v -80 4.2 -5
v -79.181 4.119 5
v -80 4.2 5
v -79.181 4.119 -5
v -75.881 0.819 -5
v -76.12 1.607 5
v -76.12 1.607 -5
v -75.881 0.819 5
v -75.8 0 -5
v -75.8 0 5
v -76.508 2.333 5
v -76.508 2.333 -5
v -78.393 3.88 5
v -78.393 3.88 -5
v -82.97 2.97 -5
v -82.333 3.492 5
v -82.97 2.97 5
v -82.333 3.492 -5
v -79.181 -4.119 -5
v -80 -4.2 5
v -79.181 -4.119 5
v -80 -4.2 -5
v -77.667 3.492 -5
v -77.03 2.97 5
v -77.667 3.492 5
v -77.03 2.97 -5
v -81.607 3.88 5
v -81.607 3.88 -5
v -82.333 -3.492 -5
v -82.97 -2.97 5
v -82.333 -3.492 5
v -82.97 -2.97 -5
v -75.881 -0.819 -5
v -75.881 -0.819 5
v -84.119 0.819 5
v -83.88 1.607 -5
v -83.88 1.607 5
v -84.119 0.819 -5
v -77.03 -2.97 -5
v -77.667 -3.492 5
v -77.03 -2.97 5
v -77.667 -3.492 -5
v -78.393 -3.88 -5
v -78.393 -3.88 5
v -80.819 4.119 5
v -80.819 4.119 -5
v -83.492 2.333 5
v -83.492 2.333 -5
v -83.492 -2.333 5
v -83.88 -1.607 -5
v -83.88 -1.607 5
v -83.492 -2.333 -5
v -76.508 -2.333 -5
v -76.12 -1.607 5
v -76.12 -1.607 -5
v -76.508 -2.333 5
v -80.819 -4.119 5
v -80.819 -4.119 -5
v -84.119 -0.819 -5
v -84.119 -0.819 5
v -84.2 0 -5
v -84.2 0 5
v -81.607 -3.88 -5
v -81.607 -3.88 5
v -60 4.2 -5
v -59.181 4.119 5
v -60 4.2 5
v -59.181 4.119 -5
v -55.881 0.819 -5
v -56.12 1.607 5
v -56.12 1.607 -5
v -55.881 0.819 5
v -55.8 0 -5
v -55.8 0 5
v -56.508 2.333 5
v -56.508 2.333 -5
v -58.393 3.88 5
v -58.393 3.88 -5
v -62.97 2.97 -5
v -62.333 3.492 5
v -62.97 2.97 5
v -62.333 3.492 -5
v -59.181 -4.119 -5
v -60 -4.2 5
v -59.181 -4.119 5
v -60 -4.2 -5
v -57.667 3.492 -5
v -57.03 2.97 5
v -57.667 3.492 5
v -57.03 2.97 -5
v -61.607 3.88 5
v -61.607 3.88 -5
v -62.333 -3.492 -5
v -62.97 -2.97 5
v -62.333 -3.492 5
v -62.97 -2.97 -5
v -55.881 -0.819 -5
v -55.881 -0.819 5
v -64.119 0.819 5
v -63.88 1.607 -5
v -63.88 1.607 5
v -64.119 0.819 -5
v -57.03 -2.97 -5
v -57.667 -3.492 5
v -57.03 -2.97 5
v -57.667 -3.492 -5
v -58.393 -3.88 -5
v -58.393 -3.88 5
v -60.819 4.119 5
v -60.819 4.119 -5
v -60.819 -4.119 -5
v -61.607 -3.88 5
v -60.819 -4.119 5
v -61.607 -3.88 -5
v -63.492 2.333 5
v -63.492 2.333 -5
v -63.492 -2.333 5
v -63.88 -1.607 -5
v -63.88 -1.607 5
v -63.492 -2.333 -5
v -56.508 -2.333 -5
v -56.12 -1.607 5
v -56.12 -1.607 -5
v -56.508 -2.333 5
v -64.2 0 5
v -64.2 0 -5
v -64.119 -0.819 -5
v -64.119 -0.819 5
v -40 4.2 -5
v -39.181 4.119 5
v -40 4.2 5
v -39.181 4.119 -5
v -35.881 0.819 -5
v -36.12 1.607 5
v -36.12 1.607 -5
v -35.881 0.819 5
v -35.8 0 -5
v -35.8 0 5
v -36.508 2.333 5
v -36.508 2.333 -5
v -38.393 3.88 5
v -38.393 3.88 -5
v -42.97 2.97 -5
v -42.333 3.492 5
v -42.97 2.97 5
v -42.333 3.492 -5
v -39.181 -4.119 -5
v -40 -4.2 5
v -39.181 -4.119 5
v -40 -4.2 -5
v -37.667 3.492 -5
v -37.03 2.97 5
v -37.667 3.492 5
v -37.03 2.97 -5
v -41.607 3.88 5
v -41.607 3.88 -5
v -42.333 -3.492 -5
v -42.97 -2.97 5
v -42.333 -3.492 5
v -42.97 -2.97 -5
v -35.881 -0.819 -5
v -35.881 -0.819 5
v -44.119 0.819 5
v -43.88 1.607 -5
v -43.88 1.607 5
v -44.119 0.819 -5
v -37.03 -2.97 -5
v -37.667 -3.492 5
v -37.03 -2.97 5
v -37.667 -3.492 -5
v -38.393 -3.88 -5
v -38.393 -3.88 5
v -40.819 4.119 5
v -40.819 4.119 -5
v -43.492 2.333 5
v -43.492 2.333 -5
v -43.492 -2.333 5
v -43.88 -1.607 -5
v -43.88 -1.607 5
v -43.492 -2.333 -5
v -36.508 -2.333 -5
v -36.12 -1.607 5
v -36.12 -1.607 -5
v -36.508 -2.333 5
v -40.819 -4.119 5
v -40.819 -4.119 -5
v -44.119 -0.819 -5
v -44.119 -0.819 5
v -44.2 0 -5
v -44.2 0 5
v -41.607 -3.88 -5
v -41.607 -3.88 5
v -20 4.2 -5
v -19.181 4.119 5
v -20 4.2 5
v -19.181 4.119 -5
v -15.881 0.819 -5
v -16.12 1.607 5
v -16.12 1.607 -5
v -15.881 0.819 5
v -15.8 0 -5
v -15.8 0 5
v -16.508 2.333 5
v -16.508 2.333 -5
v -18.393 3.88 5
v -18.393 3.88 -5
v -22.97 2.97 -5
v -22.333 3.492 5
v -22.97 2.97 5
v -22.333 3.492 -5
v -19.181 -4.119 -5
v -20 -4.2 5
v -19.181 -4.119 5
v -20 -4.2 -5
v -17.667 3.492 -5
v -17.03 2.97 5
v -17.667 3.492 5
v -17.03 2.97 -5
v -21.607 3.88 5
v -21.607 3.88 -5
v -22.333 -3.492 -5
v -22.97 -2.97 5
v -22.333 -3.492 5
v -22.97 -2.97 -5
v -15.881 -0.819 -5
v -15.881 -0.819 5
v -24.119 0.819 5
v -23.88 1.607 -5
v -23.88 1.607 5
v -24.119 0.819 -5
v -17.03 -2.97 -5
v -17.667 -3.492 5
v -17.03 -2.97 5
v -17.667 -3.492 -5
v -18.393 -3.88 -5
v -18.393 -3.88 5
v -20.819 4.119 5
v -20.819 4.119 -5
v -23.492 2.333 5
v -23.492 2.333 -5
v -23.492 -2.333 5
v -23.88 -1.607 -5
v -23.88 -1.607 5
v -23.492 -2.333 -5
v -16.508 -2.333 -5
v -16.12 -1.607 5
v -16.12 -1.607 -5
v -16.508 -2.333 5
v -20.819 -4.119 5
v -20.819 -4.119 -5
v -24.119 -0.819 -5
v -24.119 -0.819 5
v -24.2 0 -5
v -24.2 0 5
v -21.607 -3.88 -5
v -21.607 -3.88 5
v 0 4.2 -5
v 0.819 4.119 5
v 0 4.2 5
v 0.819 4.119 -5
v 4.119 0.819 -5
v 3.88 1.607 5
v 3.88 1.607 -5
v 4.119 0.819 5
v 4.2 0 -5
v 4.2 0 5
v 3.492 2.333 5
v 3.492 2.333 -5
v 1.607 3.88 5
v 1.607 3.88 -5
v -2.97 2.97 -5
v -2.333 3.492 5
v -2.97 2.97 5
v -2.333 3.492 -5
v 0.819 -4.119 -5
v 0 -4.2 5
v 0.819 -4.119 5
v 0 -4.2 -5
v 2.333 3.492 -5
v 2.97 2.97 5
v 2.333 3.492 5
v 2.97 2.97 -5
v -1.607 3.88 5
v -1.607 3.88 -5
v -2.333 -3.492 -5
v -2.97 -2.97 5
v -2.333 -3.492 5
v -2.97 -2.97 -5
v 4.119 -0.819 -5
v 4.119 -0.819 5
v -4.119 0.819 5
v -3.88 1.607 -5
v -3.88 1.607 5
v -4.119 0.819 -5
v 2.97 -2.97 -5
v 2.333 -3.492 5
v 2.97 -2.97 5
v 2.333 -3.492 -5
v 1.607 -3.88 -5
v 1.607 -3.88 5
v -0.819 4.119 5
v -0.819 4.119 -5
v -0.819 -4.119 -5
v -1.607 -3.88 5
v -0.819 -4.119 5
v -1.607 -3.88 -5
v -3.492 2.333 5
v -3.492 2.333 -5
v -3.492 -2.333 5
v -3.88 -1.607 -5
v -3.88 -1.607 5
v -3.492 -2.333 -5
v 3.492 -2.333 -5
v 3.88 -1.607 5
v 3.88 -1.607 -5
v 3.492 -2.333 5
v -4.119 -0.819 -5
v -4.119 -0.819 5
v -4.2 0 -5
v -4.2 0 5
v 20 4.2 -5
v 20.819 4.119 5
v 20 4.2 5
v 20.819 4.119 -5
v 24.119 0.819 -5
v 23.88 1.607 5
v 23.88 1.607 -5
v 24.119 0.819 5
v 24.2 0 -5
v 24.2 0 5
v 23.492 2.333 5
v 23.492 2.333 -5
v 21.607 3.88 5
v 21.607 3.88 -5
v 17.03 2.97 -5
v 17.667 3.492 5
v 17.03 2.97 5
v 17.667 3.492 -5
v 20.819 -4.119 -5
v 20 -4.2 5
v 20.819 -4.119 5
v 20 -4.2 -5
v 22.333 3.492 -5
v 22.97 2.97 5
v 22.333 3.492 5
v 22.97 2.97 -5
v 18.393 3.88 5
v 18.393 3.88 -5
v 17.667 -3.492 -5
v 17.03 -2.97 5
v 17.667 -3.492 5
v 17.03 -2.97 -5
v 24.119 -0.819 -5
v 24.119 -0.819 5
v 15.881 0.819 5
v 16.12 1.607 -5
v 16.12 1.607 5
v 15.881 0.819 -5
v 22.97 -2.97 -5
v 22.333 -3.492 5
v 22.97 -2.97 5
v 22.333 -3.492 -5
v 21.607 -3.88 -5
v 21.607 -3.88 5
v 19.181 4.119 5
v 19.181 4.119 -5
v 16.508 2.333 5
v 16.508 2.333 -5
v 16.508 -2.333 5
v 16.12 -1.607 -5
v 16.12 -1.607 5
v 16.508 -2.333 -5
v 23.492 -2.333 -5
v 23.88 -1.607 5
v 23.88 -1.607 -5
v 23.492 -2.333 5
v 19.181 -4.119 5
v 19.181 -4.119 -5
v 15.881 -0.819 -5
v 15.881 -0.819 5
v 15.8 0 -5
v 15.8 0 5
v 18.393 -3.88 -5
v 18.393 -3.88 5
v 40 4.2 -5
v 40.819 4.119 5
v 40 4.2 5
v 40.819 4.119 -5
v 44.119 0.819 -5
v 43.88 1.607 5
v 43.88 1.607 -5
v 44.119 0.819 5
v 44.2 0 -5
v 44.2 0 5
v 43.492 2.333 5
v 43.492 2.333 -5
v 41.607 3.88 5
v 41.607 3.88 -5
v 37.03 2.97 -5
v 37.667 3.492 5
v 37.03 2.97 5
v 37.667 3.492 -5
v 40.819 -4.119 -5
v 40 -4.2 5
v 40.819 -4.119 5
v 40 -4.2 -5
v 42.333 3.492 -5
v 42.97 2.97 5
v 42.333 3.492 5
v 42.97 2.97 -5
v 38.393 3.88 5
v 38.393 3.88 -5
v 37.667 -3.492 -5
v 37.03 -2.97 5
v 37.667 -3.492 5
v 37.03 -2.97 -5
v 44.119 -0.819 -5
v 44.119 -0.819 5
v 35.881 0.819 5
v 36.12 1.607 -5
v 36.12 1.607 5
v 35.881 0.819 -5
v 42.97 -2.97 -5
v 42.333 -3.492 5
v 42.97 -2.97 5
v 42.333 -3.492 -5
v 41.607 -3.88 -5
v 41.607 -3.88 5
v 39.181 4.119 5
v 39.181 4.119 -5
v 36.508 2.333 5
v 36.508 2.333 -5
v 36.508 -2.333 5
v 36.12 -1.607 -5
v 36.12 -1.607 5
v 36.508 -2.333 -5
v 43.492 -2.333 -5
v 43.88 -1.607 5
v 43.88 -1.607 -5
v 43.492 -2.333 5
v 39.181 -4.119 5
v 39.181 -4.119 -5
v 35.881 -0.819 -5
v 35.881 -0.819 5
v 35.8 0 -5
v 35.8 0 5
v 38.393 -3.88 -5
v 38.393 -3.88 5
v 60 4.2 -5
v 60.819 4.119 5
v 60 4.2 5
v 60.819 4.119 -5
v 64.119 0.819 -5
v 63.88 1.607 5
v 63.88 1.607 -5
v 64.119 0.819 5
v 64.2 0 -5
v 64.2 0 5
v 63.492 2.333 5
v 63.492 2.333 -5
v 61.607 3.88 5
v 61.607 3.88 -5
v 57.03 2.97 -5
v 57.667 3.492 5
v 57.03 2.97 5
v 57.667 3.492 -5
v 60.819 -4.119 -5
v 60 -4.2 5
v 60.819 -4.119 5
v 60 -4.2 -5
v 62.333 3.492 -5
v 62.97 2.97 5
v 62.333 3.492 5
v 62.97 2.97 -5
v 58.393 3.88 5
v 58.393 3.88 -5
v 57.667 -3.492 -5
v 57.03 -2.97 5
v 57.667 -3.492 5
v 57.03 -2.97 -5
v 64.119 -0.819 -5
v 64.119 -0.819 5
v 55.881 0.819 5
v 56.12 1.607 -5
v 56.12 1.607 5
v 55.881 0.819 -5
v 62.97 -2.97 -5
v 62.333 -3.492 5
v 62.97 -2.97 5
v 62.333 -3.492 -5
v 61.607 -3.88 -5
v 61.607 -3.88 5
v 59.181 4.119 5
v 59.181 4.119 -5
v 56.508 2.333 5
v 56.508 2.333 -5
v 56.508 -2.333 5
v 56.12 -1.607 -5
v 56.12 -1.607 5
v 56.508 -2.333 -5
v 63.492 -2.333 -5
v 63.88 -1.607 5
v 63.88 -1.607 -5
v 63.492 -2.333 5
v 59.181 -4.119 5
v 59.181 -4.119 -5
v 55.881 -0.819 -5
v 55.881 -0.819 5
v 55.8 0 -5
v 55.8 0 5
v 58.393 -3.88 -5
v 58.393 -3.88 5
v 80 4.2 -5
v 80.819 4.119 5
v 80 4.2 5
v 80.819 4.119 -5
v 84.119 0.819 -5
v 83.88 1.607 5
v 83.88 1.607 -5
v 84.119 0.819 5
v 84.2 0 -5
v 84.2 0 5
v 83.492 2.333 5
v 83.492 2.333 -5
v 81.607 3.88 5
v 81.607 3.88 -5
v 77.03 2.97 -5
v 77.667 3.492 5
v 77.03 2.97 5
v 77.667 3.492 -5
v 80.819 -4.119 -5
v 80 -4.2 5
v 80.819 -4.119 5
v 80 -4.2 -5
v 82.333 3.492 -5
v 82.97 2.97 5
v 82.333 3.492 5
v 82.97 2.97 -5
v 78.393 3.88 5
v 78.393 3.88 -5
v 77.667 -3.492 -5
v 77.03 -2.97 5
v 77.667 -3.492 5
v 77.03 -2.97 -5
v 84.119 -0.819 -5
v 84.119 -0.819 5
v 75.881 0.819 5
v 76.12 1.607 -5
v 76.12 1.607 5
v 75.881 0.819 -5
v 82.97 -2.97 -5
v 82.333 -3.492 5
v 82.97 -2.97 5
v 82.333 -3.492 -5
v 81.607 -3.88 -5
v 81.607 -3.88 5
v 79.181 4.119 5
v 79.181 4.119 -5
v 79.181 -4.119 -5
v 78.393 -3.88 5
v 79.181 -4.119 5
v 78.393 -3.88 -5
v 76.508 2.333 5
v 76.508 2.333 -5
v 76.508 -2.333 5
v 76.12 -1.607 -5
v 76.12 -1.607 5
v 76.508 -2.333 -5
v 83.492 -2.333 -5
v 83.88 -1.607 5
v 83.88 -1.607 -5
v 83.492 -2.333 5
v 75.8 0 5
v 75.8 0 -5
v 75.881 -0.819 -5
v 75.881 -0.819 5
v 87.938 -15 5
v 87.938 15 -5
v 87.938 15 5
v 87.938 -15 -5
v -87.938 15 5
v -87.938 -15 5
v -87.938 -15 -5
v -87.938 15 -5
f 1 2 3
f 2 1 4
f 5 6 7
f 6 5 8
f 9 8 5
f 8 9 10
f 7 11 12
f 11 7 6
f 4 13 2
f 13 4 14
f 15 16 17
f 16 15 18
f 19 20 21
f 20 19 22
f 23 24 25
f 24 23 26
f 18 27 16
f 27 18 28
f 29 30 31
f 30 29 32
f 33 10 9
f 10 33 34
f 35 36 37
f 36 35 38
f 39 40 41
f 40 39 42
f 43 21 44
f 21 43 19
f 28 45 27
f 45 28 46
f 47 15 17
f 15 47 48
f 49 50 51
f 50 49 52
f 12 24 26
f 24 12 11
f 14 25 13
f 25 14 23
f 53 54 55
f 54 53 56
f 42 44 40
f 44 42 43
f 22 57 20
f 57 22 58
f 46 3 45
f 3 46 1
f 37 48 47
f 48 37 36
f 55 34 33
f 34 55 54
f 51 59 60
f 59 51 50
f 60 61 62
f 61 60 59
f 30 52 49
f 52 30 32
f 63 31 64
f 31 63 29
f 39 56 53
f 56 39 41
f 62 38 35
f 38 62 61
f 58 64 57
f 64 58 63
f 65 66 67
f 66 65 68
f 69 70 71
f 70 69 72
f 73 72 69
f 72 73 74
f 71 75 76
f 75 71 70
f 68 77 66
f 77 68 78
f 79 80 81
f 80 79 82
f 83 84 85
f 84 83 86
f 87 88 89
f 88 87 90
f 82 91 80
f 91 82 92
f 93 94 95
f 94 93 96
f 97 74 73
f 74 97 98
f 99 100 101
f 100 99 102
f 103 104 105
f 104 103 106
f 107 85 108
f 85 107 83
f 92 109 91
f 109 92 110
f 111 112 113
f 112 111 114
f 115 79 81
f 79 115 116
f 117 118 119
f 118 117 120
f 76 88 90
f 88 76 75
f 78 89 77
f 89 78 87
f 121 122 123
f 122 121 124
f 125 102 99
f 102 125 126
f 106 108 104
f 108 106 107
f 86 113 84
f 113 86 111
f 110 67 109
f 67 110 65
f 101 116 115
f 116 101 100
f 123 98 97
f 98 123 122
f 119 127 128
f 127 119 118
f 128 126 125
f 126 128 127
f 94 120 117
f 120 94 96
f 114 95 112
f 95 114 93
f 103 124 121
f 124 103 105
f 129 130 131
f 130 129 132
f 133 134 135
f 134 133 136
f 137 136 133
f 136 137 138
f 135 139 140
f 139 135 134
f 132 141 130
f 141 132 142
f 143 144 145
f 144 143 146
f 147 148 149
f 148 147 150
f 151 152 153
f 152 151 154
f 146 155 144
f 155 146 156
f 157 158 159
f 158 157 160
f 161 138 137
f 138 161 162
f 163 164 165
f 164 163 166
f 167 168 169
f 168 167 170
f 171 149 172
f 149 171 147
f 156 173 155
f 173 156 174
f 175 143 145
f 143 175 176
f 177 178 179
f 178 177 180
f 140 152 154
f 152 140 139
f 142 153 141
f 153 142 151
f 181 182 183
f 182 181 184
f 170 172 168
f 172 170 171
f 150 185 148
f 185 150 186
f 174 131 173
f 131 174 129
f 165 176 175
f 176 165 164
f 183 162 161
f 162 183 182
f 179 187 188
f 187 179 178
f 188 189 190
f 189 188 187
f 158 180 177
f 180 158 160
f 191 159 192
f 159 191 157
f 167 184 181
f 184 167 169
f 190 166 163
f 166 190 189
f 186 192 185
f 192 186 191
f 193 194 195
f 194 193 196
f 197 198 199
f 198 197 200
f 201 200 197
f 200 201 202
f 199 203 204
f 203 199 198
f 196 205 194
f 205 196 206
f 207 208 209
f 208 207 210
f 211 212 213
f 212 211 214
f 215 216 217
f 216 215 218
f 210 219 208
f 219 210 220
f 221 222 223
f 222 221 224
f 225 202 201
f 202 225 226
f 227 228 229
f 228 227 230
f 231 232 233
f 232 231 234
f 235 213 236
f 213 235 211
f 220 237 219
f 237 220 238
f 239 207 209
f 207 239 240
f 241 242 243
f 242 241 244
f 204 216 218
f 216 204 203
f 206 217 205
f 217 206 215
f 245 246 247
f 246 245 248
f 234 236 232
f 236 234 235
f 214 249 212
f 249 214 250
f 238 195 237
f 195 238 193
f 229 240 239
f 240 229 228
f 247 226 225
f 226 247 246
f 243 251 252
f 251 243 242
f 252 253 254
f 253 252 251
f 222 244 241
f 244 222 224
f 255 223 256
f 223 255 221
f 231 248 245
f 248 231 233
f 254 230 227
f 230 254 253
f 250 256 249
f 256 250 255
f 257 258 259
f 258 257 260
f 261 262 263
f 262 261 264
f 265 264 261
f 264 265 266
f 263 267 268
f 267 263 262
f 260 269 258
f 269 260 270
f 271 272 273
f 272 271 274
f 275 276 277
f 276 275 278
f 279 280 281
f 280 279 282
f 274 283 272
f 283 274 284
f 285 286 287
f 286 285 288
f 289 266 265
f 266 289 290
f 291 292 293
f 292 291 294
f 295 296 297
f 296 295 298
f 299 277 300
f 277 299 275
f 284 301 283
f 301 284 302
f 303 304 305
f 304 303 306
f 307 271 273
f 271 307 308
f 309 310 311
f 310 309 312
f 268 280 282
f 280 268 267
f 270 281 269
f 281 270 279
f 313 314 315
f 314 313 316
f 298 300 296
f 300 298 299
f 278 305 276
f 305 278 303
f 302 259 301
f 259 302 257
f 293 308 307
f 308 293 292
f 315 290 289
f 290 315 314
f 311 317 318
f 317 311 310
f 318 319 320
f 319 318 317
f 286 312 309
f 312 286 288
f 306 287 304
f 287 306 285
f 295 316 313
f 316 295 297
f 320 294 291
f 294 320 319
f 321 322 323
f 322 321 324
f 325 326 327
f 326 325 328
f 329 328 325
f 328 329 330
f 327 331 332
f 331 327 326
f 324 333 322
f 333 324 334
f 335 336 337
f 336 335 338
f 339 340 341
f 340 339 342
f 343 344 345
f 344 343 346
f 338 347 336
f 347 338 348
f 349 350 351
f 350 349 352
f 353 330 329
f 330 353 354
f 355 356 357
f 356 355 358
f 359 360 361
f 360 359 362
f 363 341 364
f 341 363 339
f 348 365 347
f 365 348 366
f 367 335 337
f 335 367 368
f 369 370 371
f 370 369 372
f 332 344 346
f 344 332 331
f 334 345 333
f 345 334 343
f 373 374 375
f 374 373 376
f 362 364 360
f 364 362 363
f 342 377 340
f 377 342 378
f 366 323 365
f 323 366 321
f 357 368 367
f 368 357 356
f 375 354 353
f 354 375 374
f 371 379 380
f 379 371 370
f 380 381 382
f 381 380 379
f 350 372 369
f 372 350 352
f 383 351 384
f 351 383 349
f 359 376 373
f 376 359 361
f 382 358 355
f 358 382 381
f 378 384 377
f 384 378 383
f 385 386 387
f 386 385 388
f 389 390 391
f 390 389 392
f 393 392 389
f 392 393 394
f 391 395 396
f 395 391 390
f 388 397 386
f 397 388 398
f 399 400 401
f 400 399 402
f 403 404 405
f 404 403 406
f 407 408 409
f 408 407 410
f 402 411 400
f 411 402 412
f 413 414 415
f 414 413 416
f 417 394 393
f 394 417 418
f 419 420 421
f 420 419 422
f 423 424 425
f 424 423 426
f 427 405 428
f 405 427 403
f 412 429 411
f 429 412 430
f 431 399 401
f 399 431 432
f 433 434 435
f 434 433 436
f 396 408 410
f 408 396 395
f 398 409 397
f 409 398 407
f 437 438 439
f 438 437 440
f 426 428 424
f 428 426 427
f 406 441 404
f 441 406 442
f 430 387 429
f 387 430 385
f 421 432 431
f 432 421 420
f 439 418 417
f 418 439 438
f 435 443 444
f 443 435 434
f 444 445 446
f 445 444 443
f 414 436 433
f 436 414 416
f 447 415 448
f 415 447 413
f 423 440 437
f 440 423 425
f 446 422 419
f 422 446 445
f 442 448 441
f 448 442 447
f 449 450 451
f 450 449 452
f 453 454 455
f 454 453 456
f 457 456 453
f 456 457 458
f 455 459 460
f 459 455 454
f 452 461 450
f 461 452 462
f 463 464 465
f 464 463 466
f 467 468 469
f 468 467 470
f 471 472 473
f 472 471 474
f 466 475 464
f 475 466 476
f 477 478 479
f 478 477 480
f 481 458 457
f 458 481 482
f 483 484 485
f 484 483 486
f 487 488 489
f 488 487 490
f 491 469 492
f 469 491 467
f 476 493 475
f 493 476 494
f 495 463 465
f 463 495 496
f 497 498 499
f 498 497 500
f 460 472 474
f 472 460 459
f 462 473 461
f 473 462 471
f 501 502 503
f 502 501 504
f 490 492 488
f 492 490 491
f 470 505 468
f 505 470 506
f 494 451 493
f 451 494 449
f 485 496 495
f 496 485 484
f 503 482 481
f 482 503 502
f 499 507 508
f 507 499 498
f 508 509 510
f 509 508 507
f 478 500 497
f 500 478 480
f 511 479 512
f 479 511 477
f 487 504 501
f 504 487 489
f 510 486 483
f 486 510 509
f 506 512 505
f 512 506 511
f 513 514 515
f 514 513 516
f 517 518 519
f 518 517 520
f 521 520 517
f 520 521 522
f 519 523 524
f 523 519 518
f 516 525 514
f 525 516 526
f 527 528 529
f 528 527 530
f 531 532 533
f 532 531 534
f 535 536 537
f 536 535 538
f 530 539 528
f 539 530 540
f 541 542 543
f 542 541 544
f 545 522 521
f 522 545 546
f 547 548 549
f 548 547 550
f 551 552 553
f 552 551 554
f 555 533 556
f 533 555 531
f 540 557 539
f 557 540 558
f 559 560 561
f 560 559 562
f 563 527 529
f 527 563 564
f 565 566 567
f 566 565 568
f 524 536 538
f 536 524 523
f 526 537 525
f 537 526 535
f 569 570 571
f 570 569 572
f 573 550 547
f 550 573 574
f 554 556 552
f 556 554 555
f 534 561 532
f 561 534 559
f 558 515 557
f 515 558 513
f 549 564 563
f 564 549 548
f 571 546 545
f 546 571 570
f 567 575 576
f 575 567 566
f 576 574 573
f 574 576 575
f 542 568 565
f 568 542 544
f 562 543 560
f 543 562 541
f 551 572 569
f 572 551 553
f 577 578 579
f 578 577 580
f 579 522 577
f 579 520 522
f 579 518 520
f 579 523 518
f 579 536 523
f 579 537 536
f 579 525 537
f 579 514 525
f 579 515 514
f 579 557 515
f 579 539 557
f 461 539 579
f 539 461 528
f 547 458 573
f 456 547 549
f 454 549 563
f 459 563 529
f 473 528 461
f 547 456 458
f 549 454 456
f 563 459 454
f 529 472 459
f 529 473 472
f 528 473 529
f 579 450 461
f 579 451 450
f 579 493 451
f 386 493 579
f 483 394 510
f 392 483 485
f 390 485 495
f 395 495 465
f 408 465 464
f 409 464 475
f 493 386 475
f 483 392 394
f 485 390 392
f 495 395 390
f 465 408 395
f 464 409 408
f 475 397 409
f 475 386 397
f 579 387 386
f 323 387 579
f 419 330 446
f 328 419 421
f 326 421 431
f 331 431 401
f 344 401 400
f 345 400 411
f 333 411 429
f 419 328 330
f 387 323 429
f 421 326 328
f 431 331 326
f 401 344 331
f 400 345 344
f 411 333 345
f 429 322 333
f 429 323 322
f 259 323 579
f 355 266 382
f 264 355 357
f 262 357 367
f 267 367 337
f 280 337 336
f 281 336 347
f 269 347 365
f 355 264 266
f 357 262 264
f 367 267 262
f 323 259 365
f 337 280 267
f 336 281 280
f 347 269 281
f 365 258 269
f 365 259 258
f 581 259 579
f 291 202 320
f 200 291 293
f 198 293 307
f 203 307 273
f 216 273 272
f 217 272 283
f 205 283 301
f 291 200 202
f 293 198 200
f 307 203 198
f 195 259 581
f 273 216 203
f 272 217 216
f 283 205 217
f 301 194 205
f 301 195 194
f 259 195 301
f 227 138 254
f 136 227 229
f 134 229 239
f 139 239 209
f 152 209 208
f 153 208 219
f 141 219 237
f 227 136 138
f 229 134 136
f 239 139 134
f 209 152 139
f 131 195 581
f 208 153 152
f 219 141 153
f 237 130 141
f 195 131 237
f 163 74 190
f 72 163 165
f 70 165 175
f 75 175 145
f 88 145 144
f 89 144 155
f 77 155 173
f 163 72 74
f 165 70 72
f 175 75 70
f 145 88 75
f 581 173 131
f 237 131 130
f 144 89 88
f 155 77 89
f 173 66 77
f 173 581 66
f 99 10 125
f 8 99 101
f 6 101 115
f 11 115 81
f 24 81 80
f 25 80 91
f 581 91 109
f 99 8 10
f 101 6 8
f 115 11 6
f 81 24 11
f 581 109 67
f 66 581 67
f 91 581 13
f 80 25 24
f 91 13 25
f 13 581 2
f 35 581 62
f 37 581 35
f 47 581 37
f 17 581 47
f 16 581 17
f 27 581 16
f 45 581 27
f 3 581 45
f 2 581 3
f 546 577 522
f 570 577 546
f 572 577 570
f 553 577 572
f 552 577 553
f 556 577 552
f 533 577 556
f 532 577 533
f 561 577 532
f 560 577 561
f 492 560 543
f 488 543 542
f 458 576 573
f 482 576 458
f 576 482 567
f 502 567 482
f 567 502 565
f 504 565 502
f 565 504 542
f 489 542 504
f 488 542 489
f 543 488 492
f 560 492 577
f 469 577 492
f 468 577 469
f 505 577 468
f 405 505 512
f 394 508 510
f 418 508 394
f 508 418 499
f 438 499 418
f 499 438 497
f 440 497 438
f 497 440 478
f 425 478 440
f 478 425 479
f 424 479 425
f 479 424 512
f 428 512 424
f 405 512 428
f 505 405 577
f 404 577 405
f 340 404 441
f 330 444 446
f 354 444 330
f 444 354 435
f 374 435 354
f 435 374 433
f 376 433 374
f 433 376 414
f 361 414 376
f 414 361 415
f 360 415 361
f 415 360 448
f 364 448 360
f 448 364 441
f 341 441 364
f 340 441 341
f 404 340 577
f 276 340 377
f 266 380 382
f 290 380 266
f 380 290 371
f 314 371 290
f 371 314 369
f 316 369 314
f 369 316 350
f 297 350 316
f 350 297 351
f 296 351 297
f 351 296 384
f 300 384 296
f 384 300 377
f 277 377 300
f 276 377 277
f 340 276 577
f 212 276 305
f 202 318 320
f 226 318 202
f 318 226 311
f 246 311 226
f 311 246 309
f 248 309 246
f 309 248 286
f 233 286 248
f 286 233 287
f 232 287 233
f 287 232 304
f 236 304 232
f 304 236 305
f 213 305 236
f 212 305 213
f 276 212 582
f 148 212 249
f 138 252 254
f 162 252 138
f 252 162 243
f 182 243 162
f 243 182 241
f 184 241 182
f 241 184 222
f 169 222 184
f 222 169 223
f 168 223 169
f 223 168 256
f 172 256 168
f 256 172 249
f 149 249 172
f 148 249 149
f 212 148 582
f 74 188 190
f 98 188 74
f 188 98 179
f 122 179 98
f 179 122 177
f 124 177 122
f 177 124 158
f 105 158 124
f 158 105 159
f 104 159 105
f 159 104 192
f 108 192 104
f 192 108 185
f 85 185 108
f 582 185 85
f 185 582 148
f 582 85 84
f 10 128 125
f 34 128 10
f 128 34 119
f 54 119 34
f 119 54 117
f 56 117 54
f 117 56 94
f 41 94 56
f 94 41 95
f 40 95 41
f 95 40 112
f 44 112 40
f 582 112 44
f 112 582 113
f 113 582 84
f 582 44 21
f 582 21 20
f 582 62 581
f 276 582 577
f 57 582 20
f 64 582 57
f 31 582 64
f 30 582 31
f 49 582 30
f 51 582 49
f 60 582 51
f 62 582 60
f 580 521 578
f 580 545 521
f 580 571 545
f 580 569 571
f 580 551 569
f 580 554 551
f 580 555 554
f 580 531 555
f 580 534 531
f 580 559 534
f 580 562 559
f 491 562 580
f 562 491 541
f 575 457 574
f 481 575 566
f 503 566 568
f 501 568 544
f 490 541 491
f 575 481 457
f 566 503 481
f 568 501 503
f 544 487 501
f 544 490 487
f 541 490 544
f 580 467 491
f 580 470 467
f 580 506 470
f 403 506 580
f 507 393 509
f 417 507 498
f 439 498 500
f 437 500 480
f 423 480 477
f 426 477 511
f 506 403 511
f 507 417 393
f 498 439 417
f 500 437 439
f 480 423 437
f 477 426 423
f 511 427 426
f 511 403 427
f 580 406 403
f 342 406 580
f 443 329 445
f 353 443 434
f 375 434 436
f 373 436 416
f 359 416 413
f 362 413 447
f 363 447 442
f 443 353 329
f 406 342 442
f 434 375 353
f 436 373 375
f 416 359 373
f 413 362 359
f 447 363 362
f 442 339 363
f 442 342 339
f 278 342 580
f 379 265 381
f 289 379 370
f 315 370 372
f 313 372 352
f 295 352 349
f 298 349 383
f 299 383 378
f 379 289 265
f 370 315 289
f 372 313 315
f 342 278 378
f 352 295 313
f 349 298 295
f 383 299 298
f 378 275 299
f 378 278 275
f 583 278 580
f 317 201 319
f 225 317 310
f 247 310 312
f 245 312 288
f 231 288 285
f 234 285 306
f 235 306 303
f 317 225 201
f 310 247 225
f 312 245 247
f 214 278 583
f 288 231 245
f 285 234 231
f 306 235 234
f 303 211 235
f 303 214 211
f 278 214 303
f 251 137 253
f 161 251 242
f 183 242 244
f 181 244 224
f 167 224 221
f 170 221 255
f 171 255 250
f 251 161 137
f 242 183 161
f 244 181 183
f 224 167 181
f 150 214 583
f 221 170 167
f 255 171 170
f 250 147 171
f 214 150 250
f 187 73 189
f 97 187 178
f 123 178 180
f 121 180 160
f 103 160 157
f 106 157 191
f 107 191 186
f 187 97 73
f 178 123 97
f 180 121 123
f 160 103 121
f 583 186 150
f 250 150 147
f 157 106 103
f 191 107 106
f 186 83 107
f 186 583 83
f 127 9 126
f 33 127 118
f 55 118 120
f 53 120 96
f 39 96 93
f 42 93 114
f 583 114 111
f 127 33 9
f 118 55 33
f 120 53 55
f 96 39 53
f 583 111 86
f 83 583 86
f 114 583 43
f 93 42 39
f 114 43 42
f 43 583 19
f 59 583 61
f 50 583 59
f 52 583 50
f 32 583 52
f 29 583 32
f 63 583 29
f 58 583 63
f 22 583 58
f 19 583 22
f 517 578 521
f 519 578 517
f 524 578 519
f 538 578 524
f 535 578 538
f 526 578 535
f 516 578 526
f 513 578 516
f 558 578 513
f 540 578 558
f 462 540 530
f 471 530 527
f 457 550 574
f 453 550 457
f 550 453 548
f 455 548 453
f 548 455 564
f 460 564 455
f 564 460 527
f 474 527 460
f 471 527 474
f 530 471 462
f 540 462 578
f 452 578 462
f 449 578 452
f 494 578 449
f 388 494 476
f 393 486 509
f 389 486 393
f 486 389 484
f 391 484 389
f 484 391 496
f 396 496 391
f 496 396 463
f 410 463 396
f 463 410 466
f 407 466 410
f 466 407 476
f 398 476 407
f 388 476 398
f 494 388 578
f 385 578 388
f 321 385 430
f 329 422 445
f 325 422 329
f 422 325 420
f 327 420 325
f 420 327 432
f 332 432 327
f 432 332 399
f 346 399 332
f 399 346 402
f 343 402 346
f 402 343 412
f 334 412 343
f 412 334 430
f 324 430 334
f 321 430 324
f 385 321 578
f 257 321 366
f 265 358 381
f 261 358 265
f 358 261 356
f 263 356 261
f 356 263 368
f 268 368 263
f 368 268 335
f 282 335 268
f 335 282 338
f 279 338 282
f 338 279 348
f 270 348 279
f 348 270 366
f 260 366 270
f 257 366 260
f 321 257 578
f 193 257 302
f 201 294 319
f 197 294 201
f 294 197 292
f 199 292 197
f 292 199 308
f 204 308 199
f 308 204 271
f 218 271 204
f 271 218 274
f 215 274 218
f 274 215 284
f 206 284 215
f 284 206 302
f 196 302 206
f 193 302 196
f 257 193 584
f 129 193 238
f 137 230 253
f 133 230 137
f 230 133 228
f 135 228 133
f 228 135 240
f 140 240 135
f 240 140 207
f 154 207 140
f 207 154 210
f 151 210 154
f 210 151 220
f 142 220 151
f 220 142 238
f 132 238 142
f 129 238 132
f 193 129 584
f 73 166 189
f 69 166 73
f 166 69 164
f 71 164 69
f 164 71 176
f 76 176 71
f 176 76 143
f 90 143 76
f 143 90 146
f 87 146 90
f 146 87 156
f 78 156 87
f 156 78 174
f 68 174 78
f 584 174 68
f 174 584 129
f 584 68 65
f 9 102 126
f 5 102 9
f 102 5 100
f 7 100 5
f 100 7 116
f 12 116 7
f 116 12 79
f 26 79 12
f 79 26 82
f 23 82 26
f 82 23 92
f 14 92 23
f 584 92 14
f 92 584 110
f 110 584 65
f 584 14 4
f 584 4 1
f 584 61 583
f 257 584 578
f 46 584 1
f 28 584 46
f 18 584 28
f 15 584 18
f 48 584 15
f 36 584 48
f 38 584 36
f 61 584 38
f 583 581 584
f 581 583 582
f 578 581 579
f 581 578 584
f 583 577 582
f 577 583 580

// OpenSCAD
$fn = 32;

// ----------------------------------------------------------------------
// Hole bar, 9 x Ø8.4
// row layout, 7.9375 mm edge offset
// ----------------------------------------------------------------------

// --- parameters (mm) ---
bar_w = 30;    // bar width (Y)
bar_t = 10;    // bar thickness (Z)
holes = 9;     // holes per row
hole_d = 8.4;  // hole diameter
edge = 7.938;  // offset from the bar end to the first hole
pitch = 20;    // pitch between neighbouring holes

// --- derived feature positions (mm) ---
span = (holes - 1) * pitch;   // = 160   distance between the end holes
bar_l = span + 2 * edge;      // = 175.88   overall bar length
start_x = -bar_l / 2 + edge;  // = -80   X of the first hole
feature_centers = [
  [start_x + 0 * pitch, 0],
  [start_x + 1 * pitch, 0],
  [start_x + 2 * pitch, 0],
  [start_x + 3 * pitch, 0],
  [start_x + 4 * pitch, 0],
  [start_x + 5 * pitch, 0],
  [start_x + 6 * pitch, 0],
  [start_x + 7 * pitch, 0],
  [start_x + 8 * pitch, 0]
];   // hole centres of the first row

// bar with one row of holes, drilled from feature_centers
difference() {
  translate([-bar_l / 2, -bar_w / 2, -bar_t / 2]) cube([bar_l, bar_w, bar_t]);
  for (centre = feature_centers)
    translate([centre[0], centre[1], 0])
      cylinder(d = hole_d, h = bar_t + 2, center = true);
}
